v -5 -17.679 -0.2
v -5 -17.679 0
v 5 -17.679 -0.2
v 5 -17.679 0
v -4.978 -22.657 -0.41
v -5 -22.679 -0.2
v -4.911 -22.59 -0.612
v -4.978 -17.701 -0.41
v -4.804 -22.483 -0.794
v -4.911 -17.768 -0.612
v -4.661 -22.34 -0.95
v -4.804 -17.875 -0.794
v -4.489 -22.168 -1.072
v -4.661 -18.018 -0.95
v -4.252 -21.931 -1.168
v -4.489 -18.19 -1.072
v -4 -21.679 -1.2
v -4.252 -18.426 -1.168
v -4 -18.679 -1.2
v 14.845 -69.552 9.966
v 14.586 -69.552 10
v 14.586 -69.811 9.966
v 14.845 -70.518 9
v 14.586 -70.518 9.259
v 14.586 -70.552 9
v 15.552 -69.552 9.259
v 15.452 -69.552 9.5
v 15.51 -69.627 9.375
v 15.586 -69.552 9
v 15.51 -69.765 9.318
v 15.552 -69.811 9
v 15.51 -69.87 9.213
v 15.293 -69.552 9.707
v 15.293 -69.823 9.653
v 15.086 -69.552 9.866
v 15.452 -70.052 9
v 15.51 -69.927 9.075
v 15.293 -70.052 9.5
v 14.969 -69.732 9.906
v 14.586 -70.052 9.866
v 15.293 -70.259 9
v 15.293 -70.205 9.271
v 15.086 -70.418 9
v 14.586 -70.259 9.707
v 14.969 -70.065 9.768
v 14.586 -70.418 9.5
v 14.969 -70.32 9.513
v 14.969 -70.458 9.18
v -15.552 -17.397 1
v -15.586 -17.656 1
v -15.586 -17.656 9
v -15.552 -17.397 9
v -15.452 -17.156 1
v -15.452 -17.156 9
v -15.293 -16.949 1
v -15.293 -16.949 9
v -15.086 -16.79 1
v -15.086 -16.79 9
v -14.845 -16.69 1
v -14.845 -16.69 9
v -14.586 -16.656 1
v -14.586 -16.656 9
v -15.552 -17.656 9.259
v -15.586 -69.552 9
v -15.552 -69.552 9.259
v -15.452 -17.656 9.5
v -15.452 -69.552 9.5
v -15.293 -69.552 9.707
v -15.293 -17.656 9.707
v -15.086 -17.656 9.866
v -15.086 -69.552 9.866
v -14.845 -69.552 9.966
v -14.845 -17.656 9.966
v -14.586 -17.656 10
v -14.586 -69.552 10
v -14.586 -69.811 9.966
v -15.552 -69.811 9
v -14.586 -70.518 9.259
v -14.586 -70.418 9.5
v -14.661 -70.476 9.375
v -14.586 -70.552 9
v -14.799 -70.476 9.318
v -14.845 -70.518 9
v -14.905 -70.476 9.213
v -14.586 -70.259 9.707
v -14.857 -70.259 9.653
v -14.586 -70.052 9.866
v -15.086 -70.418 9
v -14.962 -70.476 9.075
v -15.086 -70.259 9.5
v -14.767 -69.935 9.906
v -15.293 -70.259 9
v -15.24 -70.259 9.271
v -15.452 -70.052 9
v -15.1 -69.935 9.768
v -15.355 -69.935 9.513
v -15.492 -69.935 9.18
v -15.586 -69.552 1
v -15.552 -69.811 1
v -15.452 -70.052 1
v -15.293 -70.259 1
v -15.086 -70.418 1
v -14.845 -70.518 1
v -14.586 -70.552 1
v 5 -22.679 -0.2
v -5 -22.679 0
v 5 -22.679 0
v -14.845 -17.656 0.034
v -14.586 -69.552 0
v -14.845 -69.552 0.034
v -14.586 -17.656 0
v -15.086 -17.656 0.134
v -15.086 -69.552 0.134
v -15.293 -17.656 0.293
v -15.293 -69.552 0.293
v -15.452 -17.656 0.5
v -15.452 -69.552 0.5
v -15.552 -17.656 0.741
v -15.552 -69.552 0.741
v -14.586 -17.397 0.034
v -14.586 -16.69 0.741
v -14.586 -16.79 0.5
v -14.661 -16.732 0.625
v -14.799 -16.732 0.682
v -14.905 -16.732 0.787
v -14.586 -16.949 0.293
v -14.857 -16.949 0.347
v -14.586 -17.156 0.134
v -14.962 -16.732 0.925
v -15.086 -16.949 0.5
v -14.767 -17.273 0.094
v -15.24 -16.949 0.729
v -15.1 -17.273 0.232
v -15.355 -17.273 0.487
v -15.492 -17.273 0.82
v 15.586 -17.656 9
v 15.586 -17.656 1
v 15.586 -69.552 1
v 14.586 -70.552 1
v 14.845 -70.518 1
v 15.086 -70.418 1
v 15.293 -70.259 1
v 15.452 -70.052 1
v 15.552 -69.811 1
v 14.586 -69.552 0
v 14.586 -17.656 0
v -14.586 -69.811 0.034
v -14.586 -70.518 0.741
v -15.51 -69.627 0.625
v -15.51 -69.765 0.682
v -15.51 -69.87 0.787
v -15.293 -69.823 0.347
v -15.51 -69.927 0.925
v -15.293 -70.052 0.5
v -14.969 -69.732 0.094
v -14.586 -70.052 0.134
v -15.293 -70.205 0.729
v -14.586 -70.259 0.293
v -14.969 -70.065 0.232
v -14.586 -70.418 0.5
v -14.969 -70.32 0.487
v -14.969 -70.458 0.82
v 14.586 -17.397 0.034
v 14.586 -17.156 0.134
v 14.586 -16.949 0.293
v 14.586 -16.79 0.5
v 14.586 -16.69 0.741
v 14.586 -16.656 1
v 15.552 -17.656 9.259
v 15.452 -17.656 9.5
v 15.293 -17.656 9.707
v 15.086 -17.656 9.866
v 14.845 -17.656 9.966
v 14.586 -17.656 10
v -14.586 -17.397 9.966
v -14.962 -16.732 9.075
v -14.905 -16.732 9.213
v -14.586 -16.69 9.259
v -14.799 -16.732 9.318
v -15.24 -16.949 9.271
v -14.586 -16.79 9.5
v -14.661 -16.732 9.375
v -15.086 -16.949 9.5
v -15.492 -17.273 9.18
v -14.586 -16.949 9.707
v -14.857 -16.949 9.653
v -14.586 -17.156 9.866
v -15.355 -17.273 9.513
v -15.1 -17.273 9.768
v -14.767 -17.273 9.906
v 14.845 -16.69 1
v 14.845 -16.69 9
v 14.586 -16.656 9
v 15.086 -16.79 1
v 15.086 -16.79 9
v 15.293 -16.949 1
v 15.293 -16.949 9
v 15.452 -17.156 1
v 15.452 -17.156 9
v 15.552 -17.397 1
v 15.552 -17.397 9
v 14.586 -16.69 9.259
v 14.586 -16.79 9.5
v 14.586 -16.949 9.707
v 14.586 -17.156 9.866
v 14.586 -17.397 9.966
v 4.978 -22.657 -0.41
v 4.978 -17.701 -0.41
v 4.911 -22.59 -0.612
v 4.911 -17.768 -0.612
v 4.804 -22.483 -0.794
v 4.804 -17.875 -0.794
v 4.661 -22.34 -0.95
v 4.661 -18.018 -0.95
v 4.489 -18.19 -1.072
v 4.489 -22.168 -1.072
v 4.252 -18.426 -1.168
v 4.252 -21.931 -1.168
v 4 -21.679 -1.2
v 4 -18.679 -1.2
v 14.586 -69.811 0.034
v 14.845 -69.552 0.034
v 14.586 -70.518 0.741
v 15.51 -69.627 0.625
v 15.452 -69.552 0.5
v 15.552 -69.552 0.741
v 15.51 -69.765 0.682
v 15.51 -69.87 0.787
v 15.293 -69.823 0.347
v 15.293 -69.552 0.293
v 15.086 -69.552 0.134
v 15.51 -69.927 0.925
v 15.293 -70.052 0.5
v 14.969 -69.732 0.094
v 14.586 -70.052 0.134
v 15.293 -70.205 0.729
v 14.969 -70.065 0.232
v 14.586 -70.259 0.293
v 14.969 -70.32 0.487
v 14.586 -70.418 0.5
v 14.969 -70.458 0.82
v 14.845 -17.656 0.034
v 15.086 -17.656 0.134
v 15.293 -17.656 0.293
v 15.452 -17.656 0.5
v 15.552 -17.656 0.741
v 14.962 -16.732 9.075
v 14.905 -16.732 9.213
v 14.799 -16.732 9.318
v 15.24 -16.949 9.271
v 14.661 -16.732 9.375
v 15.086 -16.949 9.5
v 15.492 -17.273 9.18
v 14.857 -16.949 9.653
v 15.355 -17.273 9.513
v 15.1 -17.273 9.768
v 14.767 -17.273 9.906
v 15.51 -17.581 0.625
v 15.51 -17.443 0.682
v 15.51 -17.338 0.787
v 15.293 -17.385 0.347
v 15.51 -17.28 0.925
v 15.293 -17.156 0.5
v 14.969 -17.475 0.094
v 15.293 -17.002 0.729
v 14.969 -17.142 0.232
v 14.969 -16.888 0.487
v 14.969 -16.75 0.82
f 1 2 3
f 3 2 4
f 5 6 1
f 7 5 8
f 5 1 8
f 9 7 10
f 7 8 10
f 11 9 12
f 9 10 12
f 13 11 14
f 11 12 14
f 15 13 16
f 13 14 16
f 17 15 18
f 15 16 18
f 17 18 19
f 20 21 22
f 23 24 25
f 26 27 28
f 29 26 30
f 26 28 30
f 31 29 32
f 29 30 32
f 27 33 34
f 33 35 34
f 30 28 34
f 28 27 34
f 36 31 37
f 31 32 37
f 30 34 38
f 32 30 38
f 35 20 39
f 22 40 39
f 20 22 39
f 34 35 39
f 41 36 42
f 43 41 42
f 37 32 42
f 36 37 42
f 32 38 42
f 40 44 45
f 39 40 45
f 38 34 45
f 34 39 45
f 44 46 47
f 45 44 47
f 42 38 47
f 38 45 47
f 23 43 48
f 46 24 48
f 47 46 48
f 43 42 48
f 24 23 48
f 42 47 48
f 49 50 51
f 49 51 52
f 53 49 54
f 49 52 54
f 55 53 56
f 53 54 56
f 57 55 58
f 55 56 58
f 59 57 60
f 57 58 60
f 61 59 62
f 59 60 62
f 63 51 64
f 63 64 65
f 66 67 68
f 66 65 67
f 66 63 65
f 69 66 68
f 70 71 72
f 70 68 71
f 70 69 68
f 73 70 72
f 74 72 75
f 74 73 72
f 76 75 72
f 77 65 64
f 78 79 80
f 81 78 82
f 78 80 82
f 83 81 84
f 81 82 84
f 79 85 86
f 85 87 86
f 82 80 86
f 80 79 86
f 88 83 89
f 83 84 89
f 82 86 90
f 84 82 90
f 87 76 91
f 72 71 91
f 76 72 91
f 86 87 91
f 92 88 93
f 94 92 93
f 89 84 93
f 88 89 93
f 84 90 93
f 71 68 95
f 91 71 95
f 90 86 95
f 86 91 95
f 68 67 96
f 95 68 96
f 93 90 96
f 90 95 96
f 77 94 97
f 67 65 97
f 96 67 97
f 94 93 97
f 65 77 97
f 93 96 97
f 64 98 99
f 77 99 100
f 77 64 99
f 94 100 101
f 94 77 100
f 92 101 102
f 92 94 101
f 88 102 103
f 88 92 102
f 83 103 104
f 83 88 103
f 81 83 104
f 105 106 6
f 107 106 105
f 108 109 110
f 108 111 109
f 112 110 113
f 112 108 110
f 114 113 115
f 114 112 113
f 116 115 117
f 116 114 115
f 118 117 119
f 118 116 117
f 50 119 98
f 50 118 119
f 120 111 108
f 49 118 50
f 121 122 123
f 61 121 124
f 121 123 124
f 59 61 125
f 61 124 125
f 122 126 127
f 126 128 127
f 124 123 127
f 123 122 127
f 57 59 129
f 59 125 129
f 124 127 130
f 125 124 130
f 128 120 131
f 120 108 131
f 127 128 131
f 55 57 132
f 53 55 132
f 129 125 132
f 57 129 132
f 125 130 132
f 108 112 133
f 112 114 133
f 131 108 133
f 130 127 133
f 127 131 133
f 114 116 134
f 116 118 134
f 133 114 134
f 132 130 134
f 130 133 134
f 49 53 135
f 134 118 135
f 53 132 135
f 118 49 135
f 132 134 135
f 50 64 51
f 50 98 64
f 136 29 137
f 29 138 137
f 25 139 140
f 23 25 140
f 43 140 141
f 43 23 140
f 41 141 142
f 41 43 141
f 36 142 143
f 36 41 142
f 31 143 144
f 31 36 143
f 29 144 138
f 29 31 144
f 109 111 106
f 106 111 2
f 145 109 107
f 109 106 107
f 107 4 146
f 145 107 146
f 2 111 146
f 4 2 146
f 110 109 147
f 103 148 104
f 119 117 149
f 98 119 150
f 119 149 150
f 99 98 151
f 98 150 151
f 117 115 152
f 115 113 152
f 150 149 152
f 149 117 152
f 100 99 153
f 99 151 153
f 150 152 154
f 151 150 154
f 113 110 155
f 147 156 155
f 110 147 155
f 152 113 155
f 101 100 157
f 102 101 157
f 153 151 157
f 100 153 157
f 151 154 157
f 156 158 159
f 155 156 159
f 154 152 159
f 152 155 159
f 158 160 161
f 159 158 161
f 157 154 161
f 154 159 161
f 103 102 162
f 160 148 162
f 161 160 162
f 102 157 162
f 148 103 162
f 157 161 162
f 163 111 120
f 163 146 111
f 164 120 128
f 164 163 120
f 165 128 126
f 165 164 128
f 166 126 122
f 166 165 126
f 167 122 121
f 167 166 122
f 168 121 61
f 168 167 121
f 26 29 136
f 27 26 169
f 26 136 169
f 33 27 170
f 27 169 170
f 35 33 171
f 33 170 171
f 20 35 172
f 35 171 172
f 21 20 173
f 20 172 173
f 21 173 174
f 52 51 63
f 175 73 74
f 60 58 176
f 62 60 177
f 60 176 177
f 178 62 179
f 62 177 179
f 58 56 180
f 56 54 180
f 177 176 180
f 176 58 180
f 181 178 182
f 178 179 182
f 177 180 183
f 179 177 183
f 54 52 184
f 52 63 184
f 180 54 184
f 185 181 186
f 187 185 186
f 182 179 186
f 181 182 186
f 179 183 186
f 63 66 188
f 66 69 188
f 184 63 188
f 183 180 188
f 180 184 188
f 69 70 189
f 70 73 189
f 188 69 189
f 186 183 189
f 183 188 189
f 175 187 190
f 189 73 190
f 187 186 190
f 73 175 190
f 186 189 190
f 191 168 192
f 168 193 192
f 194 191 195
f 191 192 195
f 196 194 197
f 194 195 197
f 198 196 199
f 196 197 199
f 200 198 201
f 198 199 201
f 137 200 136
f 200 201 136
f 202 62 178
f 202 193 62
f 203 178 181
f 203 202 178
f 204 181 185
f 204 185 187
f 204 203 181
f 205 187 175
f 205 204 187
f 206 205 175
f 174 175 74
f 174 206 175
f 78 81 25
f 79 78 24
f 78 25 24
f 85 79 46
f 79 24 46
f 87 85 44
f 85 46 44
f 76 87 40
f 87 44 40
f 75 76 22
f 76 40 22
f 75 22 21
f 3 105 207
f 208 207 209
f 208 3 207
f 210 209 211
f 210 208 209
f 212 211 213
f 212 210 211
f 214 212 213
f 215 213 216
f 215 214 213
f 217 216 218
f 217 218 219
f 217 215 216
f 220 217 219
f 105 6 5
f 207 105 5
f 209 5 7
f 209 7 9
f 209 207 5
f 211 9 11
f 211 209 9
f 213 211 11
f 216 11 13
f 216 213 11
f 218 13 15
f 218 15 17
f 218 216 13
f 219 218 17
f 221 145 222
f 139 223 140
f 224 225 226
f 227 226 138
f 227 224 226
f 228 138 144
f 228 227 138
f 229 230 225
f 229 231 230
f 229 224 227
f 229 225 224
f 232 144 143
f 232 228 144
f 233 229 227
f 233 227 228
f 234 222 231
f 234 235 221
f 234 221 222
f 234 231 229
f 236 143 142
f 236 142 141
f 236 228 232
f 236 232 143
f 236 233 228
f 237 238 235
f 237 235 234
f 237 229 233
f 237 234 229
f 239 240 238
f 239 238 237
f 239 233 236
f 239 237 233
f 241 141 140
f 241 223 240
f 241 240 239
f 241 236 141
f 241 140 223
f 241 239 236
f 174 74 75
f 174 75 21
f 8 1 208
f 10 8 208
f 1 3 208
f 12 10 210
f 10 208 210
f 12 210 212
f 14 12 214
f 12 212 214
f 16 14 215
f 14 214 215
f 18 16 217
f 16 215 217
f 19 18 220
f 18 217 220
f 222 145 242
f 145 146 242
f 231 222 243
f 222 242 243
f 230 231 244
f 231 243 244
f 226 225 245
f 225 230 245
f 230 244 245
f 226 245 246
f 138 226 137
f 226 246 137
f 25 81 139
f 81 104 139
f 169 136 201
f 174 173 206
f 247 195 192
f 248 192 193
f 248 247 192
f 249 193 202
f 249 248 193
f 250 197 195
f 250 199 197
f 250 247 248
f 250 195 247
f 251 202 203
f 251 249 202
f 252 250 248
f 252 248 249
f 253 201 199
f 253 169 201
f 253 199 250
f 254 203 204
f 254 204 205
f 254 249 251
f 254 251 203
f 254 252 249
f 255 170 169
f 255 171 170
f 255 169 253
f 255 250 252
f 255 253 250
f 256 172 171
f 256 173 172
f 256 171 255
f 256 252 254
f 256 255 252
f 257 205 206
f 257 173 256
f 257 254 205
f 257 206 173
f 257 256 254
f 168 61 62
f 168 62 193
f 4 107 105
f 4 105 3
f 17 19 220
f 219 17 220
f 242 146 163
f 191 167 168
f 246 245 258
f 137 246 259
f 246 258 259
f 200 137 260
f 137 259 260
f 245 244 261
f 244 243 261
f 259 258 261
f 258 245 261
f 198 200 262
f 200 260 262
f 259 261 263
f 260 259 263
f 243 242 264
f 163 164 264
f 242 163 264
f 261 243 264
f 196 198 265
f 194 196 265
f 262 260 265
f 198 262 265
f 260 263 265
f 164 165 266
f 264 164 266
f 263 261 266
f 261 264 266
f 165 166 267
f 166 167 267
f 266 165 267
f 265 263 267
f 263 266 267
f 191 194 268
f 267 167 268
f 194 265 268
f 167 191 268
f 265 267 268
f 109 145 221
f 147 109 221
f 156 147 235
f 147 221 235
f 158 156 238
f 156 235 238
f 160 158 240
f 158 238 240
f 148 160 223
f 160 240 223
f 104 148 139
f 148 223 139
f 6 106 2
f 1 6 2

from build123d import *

# Parameters (mm, degrees)
SKETCH_1_W      = 31.172738554
SKETCH_1_H      = 53.896192989
EXTRUDE_1_DEPTH = 10
SKETCH_2_W      = 10
SKETCH_2_H      = 5
EXTRUDE_3_DEPTH = 1.2
FILLET_1_R      = 1
FILLET_2_R      = 1


with BuildPart() as part:
    # 草圖1 → 填料-伸長1 (new body)
    with BuildSketch(Plane.XY):
        with Locations((0, -43.60381631)):
            Rectangle(SKETCH_1_W, SKETCH_1_H)
    extrude(amount=EXTRUDE_1_DEPTH)

    # 草圖2 → 填料-伸長3 (add)
    with BuildSketch(Plane.XY):
        with Locations((0, -20.178917106)):
            Rectangle(SKETCH_2_W, SKETCH_2_H)
    extrude(amount=-EXTRUDE_3_DEPTH)

    # 圓角1
    fillet_1_edges = [part.edges().sort_by_distance(p)[0] for p in [
        (-5, -20.178917106, -1.2),
        (0, -17.678917106, -1.2),
        (5, -20.178917106, -1.2),
        (0, -22.678917106, -1.2),
    ]]
    fillet(fillet_1_edges, radius=FILLET_1_R)

    # 圓角2
    fillet_2_edges = [part.edges().sort_by_distance(p)[0] for p in [
        (-15.586369277, -43.60381631, 10),
        (0, -70.551912804, 10),
        (15.586369277, -43.60381631, 10),
        (0, -70.551912804, 0),
        (-15.586369277, -43.60381631, 0),
        (0, -16.655719815, 0),
        (15.586369277, -43.60381631, 0),
        (15.586369277, -70.551912804, 5),
        (-15.586369277, -70.551912804, 5),
        (-15.586369277, -16.655719815, 5),
        (15.586369277, -16.655719815, 5),
        (0, -16.655719815, 10),
    ]]
    fillet(fillet_2_edges, radius=FILLET_2_R)


solid = part.part
